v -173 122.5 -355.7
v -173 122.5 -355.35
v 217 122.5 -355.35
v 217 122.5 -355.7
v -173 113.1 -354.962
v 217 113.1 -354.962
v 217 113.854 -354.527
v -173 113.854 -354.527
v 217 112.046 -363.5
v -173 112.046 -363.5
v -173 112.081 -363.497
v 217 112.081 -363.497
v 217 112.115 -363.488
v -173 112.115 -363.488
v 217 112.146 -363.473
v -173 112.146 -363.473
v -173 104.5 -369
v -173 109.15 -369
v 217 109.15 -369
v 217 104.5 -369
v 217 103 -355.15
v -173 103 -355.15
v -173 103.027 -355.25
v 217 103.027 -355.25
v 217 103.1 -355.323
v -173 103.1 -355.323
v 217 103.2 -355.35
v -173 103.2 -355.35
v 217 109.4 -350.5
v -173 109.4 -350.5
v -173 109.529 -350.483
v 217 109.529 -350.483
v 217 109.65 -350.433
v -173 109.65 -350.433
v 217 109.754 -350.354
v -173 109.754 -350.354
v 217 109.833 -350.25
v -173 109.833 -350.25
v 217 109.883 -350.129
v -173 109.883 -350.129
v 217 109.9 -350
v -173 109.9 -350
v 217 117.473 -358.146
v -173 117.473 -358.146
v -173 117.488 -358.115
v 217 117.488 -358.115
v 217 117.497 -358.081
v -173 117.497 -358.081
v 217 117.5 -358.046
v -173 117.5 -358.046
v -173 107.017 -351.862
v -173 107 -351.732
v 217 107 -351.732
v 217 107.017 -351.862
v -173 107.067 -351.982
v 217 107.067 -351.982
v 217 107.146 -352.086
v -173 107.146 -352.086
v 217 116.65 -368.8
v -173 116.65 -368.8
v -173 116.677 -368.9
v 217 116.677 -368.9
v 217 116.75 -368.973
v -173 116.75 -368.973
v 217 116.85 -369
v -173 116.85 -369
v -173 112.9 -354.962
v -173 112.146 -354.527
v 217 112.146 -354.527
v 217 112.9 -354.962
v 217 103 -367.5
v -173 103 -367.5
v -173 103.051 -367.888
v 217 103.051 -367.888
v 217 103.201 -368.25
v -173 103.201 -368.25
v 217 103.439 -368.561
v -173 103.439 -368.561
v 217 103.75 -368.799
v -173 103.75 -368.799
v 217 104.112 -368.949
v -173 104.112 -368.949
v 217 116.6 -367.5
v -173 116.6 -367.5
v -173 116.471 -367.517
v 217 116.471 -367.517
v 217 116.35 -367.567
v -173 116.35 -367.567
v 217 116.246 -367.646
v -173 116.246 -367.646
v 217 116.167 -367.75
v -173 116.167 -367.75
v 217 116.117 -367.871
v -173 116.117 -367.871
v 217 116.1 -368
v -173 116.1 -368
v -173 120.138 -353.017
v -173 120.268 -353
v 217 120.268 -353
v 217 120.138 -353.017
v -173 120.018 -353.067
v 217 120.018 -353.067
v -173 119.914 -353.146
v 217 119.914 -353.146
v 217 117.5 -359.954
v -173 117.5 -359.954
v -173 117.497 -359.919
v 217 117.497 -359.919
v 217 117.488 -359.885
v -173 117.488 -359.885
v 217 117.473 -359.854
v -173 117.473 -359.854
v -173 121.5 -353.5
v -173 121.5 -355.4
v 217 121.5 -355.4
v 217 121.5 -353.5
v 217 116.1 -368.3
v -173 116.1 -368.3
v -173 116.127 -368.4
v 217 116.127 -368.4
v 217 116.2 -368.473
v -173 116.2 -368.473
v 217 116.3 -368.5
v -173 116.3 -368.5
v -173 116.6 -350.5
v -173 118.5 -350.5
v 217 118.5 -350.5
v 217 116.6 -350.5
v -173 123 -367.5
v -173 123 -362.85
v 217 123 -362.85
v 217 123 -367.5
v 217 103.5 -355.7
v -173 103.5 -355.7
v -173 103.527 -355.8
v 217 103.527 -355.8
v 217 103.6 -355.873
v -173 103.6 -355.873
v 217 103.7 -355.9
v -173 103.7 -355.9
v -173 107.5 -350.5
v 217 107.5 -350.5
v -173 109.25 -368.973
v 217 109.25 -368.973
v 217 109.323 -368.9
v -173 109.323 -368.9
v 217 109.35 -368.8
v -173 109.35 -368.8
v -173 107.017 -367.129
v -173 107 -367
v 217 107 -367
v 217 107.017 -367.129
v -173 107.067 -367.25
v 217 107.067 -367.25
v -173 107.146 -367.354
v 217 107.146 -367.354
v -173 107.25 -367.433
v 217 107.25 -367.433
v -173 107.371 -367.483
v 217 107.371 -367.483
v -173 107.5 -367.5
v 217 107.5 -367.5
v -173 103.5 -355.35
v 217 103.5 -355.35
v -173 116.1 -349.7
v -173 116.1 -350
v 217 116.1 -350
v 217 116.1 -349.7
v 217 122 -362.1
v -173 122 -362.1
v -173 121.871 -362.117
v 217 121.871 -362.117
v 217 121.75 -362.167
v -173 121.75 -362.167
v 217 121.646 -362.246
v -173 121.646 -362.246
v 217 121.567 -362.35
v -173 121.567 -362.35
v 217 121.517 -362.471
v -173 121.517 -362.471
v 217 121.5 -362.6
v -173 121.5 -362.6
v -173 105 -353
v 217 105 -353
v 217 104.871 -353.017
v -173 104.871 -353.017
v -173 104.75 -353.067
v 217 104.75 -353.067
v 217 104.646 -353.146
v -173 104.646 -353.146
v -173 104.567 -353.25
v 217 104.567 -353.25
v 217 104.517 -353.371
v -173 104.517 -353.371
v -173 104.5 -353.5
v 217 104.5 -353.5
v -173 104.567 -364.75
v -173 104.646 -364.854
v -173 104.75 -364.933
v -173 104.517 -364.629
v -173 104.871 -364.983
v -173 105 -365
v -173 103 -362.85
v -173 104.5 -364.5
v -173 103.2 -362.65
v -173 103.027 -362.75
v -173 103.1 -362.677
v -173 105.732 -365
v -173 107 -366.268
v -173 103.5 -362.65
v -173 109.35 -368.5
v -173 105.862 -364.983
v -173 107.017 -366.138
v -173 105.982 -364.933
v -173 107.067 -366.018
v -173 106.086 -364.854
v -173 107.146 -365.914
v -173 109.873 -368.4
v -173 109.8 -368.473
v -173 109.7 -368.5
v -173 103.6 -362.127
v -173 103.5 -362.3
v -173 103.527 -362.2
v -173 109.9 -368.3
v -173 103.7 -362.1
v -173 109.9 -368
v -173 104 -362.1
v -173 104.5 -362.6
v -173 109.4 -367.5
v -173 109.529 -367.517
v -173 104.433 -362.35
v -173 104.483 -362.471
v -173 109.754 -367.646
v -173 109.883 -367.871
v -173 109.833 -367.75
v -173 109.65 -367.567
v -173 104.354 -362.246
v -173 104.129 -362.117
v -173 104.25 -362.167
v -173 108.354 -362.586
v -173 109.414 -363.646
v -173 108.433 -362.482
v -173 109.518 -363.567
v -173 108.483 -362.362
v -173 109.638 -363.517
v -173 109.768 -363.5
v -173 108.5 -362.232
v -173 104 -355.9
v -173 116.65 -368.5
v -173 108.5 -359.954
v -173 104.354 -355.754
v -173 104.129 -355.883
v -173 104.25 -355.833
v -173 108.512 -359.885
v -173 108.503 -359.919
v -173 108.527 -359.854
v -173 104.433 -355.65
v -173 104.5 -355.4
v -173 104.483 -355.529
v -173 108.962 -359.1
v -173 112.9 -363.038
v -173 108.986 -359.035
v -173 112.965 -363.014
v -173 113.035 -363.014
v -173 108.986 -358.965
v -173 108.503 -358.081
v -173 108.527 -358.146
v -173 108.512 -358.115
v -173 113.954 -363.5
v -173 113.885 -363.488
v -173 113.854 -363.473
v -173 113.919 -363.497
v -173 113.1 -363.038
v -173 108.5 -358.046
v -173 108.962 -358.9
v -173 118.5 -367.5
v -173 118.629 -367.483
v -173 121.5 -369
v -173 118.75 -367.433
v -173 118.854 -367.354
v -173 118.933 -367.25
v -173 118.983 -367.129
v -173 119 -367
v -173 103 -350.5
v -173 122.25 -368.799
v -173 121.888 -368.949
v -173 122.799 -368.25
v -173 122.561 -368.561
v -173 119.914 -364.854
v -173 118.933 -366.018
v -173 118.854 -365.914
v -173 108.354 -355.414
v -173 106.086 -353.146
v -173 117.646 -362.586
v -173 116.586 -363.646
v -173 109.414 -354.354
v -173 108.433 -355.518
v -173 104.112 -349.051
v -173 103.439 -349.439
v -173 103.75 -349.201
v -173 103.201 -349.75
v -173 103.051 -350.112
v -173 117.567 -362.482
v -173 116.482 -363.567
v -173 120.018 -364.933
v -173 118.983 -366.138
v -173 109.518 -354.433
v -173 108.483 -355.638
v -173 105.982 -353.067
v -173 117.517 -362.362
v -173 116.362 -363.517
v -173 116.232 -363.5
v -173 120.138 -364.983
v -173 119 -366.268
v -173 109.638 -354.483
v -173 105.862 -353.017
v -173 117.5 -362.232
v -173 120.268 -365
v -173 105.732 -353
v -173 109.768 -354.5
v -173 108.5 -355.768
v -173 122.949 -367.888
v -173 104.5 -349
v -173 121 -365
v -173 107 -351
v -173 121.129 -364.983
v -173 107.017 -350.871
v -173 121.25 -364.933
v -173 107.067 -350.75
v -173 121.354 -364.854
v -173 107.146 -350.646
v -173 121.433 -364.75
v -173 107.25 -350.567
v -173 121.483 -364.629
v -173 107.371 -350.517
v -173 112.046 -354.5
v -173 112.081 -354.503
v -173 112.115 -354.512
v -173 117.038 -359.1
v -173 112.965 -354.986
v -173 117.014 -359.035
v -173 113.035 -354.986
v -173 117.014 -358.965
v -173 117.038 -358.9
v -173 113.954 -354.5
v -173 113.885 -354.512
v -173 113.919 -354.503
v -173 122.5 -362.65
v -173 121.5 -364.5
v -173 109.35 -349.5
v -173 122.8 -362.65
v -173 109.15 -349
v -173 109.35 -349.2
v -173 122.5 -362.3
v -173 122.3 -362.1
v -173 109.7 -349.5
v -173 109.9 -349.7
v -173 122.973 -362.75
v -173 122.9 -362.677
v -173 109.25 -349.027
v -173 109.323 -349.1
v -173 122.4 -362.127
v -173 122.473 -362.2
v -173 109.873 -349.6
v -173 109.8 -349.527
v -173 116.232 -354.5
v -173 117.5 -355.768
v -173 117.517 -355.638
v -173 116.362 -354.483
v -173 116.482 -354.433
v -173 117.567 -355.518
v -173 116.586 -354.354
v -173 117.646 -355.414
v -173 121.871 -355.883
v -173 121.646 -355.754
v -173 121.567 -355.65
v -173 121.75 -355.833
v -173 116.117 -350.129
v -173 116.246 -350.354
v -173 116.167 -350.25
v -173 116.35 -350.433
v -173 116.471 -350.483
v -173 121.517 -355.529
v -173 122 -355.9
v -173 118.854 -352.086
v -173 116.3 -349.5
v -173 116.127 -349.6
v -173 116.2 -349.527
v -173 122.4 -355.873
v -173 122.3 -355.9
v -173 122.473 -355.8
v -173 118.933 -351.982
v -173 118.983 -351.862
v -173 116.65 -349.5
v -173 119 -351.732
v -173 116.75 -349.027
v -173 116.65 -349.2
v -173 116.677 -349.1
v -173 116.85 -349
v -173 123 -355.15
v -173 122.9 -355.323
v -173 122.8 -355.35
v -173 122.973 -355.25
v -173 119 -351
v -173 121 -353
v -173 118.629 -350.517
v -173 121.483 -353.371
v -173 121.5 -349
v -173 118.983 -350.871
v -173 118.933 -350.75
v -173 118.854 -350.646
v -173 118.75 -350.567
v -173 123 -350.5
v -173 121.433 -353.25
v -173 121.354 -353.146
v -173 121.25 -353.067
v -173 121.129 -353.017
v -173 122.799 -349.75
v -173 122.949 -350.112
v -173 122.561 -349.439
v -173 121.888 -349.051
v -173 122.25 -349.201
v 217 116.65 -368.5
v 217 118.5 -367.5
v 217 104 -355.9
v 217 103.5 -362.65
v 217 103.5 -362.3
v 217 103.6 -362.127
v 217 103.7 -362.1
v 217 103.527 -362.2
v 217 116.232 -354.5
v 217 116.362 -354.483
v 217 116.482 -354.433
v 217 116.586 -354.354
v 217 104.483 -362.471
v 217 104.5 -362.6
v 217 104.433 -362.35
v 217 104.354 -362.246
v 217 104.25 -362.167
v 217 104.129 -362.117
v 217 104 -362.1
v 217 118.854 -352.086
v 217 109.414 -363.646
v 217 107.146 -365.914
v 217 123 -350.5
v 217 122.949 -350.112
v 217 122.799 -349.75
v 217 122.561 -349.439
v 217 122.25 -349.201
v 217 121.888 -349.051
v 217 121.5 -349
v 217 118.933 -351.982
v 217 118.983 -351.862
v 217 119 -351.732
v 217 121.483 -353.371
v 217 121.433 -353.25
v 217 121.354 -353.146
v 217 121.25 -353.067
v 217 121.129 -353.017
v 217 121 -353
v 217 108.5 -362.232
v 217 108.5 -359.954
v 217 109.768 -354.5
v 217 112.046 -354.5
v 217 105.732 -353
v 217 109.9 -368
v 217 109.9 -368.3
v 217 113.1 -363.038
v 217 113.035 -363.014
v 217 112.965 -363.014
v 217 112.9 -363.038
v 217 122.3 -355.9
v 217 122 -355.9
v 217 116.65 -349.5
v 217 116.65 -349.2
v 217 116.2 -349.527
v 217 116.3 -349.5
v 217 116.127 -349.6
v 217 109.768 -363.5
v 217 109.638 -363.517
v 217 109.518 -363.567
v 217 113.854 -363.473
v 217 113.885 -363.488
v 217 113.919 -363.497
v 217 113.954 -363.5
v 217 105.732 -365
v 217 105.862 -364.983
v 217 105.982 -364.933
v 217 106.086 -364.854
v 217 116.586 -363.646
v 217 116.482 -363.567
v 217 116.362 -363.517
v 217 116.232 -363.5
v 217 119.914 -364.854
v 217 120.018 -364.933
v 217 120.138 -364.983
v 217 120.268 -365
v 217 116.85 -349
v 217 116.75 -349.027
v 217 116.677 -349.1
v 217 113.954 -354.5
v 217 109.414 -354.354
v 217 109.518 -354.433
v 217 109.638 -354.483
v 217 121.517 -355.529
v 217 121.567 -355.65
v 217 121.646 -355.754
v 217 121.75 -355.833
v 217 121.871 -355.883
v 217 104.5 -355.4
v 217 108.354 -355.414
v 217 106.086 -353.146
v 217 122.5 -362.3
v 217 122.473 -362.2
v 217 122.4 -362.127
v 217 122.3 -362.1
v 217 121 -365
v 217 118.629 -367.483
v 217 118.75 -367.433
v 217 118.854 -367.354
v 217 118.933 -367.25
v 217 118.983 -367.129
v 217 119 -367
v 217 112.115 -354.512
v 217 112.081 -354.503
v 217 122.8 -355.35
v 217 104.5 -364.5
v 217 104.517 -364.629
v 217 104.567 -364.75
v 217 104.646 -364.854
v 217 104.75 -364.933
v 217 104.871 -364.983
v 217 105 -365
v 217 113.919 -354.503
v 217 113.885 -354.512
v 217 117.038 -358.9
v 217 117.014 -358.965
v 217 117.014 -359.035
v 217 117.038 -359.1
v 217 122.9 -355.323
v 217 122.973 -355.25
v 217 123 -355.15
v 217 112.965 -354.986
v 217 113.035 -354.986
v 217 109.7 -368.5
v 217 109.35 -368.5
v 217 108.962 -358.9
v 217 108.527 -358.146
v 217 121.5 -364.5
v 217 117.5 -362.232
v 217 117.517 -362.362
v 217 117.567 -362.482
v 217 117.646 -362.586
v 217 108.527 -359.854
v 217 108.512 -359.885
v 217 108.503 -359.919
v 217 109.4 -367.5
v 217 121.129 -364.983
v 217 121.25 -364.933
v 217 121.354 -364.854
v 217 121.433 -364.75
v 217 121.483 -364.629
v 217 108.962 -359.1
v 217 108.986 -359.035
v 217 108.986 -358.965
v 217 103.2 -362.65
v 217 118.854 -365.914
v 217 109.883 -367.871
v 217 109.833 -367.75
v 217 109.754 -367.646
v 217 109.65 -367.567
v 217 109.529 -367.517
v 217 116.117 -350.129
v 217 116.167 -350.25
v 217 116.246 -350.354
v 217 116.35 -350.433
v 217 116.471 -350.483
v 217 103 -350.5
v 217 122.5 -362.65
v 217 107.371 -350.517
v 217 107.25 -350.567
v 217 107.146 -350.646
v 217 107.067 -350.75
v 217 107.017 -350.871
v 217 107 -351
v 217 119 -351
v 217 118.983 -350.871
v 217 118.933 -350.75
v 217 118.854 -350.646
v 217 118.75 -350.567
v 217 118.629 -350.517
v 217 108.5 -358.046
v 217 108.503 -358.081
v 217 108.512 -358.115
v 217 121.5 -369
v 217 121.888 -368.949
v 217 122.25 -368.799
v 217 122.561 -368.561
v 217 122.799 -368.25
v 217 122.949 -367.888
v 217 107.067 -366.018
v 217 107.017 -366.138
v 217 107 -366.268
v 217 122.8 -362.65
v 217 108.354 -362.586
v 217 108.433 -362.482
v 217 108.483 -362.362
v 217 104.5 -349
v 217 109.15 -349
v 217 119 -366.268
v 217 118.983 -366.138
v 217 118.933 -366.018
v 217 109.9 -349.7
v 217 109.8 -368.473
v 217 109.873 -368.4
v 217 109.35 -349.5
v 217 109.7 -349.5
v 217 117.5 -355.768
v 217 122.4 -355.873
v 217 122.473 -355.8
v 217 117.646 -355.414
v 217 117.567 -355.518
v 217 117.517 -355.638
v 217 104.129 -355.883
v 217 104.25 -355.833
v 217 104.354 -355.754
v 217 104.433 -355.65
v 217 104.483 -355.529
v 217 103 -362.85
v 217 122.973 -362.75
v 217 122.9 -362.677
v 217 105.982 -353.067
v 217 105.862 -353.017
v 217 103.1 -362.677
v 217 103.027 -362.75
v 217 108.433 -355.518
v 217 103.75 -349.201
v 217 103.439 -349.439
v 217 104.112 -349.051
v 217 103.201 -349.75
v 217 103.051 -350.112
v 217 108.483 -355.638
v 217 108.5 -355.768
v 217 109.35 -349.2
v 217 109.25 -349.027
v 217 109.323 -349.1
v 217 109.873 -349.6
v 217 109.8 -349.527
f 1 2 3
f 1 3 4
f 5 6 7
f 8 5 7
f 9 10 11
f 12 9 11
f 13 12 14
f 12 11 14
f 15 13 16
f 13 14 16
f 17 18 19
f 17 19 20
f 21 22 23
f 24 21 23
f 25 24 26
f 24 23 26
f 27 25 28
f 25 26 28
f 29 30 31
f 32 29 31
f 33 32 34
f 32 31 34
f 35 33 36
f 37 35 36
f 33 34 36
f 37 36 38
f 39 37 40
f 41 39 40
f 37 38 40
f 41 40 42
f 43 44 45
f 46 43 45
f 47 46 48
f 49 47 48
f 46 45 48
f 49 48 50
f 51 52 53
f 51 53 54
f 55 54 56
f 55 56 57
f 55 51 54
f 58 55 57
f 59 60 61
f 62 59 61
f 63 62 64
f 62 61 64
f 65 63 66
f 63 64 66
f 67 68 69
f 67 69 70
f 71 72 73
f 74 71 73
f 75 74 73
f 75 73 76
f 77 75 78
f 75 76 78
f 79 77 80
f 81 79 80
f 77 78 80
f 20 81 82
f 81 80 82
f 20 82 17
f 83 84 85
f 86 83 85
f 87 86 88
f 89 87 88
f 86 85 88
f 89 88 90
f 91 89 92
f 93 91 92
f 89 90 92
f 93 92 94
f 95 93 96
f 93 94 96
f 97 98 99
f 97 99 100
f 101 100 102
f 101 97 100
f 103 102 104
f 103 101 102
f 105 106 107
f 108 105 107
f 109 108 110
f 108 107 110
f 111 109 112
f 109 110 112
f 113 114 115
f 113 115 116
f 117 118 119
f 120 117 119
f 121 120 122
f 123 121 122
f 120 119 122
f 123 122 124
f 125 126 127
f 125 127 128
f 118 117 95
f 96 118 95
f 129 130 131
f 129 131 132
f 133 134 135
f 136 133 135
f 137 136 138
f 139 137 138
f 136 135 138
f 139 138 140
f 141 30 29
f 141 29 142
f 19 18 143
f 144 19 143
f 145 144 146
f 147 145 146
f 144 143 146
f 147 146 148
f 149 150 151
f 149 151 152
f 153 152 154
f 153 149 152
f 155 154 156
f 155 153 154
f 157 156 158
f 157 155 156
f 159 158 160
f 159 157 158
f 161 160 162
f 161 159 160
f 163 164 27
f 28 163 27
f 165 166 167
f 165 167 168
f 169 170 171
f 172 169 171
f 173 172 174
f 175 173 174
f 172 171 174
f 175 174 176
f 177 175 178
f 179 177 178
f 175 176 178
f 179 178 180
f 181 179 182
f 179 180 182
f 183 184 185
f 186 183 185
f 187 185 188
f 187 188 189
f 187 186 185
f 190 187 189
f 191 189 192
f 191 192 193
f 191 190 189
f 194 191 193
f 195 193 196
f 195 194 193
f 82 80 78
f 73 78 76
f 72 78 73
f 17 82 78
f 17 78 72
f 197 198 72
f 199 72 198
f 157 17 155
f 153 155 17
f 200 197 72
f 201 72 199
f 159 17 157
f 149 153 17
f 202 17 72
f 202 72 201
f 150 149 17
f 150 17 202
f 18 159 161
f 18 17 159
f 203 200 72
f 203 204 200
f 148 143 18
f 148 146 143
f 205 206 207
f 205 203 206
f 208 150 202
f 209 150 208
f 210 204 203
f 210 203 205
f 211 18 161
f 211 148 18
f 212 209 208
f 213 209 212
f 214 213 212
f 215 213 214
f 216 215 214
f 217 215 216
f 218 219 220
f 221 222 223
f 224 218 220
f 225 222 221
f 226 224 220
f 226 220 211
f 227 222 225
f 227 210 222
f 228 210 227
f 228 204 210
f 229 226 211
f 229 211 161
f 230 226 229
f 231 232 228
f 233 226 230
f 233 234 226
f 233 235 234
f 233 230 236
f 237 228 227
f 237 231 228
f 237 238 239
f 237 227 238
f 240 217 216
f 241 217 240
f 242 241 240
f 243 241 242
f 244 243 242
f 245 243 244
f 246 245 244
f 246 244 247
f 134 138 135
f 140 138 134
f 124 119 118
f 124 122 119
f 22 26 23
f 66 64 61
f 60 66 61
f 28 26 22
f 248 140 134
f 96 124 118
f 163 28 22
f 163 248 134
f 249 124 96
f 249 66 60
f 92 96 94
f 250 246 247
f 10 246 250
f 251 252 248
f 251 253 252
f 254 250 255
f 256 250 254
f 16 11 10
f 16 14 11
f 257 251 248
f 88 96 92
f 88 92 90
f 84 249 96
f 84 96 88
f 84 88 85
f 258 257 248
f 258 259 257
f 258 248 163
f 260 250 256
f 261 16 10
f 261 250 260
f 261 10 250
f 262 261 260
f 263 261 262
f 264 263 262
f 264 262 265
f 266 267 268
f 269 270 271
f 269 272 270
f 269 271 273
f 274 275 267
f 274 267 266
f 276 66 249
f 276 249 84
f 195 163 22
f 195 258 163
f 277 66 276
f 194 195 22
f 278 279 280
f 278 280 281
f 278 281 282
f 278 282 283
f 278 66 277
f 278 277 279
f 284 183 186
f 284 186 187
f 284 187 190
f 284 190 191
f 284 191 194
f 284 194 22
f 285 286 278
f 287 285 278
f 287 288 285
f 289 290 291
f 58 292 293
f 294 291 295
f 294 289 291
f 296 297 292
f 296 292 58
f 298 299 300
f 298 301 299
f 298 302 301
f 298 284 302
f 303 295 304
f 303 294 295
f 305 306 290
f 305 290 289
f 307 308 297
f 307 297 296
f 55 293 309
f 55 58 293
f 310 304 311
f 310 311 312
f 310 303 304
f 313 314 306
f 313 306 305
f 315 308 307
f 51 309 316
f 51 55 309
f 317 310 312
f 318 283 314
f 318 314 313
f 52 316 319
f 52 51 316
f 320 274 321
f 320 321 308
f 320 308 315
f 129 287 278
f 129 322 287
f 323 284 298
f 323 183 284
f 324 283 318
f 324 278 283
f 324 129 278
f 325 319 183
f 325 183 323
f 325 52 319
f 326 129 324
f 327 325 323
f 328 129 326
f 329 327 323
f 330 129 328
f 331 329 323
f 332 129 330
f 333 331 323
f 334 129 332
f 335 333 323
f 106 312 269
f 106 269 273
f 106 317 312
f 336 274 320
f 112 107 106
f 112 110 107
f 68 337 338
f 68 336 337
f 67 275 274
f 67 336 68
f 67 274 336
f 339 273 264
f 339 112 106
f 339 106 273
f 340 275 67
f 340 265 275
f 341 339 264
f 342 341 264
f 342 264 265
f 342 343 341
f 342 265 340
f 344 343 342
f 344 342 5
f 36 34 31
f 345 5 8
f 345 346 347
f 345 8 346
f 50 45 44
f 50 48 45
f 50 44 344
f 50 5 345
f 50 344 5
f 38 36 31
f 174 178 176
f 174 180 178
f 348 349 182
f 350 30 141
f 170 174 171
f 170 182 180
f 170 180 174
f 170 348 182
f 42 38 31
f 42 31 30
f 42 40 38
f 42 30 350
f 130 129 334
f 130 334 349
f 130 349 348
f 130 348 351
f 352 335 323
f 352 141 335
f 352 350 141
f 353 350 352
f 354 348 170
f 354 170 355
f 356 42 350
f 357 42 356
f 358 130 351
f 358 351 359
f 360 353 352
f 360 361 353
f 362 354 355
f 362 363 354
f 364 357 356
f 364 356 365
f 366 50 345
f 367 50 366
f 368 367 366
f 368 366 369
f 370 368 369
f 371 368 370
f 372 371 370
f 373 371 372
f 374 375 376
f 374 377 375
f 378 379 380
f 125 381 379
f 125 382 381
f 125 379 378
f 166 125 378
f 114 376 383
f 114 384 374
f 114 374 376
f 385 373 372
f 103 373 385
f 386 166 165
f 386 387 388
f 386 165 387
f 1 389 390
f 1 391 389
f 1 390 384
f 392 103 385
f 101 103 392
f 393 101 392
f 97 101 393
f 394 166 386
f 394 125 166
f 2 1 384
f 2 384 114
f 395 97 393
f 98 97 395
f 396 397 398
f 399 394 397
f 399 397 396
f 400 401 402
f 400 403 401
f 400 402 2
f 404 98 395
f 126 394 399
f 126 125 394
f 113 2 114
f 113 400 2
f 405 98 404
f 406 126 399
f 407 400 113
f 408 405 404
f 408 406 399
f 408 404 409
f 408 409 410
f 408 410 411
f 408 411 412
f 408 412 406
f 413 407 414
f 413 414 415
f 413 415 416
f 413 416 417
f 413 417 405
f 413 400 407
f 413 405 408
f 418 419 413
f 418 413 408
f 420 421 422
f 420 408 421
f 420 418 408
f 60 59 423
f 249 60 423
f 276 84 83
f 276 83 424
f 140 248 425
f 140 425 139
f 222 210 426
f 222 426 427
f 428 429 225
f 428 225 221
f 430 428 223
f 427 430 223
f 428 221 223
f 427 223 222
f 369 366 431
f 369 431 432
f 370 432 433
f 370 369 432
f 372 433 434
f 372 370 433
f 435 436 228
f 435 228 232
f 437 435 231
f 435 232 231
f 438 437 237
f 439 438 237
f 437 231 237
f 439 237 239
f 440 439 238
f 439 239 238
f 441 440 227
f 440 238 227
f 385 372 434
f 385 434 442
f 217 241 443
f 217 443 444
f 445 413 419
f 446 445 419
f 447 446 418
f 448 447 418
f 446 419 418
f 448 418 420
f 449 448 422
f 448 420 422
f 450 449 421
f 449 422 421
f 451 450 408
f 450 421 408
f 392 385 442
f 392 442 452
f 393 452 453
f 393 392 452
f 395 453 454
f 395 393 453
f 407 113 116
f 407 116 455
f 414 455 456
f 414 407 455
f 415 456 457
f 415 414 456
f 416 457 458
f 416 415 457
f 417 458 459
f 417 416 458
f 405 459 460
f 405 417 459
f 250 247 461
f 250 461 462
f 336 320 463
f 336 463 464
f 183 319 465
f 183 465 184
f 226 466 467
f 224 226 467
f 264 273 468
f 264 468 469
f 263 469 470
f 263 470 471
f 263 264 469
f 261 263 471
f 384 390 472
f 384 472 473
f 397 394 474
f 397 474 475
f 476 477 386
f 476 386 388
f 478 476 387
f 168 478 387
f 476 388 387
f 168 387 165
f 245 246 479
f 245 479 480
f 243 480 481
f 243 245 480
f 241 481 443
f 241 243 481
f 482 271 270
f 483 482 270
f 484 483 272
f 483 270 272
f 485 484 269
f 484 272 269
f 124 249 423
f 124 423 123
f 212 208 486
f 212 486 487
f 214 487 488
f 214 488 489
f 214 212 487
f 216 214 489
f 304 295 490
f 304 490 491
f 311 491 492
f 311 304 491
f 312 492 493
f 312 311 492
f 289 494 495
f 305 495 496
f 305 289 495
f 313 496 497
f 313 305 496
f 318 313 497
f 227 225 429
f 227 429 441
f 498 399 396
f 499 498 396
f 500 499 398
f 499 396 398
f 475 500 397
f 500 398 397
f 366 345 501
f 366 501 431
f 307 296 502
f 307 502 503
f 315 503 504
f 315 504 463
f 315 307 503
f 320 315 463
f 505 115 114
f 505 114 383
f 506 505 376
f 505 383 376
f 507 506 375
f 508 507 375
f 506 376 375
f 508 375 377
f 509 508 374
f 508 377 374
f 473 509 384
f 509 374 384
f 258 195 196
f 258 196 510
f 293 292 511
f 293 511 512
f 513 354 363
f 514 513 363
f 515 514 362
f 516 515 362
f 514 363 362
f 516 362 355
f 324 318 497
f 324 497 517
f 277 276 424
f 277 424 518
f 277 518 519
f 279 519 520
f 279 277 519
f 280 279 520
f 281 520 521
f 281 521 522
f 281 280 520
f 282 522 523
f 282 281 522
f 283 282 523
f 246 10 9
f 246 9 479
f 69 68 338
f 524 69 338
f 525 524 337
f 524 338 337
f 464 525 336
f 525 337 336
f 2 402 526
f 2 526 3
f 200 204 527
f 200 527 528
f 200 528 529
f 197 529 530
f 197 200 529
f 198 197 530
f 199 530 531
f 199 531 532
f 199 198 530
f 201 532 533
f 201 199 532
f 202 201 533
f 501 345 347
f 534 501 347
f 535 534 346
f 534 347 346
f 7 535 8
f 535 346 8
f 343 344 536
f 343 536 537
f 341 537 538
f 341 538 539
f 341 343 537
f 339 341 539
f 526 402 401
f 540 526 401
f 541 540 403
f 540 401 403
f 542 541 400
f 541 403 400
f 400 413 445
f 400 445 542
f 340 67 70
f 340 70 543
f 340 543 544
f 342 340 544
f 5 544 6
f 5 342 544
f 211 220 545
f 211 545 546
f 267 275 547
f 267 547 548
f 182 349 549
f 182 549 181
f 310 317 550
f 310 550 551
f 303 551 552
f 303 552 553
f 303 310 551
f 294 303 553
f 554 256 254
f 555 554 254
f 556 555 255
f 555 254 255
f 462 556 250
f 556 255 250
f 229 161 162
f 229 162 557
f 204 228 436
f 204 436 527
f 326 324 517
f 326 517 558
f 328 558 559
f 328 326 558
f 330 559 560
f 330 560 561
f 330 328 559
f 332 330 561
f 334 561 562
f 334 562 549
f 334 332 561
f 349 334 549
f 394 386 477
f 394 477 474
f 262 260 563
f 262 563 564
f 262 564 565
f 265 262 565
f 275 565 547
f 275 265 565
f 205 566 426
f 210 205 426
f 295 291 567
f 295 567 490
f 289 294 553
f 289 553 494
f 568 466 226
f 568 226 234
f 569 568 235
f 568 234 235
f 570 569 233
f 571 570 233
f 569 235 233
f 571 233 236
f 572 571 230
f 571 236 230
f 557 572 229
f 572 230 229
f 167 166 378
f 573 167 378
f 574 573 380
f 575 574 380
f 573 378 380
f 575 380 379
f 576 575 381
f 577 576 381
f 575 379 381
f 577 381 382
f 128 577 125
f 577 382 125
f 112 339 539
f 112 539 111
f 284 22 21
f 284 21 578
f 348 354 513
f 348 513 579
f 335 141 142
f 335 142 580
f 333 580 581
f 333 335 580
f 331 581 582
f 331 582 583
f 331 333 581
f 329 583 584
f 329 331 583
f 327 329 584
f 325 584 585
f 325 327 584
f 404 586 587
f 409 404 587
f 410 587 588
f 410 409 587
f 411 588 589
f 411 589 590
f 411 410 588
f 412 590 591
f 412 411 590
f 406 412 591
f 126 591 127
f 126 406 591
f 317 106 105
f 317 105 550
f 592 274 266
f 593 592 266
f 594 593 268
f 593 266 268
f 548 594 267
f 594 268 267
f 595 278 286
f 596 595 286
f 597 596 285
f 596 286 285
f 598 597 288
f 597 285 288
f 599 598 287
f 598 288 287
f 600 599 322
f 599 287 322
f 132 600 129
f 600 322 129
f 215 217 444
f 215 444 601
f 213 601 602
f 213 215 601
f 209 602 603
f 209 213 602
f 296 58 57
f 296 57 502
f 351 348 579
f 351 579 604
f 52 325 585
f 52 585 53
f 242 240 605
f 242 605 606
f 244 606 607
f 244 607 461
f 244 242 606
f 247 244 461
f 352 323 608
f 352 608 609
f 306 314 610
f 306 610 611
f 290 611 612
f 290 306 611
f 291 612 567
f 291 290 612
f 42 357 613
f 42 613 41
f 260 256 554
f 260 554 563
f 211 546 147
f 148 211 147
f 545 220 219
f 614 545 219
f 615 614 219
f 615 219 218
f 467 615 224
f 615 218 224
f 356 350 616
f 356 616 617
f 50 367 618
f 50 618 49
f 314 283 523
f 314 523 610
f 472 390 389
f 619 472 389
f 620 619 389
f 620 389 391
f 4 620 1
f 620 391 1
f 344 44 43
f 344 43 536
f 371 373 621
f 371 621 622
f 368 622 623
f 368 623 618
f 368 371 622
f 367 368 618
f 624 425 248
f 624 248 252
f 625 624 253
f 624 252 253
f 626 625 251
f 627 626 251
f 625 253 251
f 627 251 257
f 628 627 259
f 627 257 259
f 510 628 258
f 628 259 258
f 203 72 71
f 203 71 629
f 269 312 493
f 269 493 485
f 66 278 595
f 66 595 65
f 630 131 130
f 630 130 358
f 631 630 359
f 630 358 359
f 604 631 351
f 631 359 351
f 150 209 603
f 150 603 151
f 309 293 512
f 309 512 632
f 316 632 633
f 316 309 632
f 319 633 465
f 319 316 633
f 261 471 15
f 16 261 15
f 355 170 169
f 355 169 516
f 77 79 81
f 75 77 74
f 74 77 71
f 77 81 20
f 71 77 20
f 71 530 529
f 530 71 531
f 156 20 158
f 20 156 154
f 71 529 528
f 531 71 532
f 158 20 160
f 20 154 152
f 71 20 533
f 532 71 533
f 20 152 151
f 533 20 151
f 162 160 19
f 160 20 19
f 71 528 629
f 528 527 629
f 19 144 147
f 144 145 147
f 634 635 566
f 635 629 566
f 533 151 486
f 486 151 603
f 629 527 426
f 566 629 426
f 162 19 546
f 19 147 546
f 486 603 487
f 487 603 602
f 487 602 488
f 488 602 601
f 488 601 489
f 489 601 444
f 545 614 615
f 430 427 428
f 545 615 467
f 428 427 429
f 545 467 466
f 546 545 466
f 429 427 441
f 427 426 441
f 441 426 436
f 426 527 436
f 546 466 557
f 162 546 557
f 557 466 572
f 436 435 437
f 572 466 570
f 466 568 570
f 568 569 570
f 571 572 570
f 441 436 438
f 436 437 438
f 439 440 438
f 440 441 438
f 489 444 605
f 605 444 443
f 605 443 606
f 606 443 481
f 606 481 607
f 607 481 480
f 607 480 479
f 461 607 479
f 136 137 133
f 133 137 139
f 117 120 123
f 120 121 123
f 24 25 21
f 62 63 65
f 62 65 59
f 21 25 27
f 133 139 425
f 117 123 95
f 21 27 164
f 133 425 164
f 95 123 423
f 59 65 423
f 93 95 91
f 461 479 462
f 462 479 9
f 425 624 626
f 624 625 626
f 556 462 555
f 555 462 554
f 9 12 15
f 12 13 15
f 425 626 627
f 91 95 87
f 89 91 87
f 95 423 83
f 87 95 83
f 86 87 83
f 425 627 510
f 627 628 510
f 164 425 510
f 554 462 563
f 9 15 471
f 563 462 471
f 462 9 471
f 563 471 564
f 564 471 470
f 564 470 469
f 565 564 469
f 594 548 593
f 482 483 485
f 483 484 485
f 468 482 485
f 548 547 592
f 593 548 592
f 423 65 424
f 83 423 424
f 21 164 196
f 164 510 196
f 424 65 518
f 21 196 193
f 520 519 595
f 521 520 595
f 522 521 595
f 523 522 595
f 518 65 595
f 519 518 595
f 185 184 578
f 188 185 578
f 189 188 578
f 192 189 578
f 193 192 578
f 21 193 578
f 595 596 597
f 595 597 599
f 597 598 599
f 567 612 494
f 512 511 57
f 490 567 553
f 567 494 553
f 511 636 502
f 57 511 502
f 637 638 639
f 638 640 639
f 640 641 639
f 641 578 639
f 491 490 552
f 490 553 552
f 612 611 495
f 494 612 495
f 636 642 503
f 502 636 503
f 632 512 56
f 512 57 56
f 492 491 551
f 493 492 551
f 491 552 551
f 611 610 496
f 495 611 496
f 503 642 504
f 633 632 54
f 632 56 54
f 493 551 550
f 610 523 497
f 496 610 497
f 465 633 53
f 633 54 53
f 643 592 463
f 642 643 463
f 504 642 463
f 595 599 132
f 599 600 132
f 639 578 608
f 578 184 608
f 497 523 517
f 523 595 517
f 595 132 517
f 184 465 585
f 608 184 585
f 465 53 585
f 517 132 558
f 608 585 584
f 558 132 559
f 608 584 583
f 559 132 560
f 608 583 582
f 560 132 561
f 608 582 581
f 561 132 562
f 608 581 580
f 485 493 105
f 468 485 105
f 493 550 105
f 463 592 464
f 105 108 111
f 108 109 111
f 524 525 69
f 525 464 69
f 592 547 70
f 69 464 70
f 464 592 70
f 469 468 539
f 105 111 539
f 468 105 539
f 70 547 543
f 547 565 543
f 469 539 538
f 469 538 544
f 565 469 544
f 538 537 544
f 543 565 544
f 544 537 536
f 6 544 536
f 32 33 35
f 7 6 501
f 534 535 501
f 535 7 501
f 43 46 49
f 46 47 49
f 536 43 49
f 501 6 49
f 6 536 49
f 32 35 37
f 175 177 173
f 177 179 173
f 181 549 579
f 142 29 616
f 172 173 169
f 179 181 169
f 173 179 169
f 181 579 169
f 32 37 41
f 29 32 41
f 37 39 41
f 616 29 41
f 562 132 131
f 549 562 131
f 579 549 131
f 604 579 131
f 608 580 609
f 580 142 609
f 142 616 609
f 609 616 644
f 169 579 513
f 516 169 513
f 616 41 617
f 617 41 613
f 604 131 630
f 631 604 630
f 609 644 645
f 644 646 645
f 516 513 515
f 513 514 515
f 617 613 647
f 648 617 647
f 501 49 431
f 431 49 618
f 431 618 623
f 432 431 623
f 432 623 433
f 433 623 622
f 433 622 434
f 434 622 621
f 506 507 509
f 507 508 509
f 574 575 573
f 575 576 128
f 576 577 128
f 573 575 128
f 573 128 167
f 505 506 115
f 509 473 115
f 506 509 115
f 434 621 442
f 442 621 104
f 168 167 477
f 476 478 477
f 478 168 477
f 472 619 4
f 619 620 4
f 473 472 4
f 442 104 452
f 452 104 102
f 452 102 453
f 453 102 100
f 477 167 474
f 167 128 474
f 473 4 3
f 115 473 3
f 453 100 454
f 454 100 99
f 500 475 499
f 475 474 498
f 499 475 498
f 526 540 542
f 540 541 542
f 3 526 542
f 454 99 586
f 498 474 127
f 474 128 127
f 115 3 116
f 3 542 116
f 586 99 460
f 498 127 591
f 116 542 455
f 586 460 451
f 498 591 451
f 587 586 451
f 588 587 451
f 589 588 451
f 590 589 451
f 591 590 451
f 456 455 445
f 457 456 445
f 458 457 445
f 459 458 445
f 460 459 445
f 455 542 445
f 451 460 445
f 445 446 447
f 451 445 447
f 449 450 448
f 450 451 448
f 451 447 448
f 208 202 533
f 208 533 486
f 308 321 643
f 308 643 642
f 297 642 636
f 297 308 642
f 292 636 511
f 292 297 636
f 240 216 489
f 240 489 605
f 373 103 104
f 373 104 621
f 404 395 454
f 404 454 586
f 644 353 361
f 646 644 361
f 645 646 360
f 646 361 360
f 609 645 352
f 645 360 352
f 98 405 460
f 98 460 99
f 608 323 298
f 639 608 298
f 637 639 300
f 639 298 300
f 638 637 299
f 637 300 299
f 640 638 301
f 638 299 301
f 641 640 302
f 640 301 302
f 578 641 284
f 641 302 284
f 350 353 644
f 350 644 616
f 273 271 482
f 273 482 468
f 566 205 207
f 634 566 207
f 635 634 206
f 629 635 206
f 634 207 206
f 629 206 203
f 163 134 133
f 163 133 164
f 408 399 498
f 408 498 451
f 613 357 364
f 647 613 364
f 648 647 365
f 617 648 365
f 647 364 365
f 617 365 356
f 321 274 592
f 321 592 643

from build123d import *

# Parameters (mm, degrees)
PAD019_DEPTH          = 390
POCKET031_DEPTH       = 390.001
FUSION040_PITCH_ANGLE = 90


with BuildPart() as pad019:
    # Sketch052 → Pad019 (new body)
    with BuildSketch(Plane(origin=(1.5, 0, 0), x_dir=(1, 0, 0), z_dir=(0, 0, 1))):
        with BuildLine():
            Line((0, 20), (4.65, 20))
            ThreePointArc((4.85, 19.8), (4.791421, 19.941421), (4.65, 20))
            Line((4.85, 19.8), (4.85, 19.5))
            Line((4.85, 19.5), (5.2, 19.5))
            ThreePointArc((5.4, 19.3), (5.341421, 19.441421), (5.2, 19.5))
            Line((5.4, 19.3), (5.4, 19))
            ThreePointArc((4.9, 18.5), (5.253553, 18.646446), (5.4, 19))
            Line((4.9, 18.5), (2.999999, 18.5))
            ThreePointArc((2.999999, 18.5), (2.646446, 18.353553), (2.499999, 18))
            Line((2.499999, 18), (2.499999, 17.267767))
            ThreePointArc((2.499999, 17.267767), (2.53806, 17.076425), (2.646446, 16.914213))
            Line((2.646446, 16.914213), (4.914213, 14.646447))
            ThreePointArc((4.914213, 14.646447), (5.076424, 14.53806), (5.267766, 14.5))
            Line((5.267766, 14.5), (7.54641, 14.5))
            ThreePointArc((7.64641, 14.473205), (7.598173, 14.493185), (7.54641, 14.5))
            Line((7.64641, 14.473205), (8.4, 14.03812))
            ThreePointArc((8.4, 14.03812), (8.5, 14.011325), (8.6, 14.03812))
            Line((8.6, 14.03812), (9.35359, 14.473205))
            ThreePointArc((9.45359, 14.5), (9.401827, 14.493185), (9.35359, 14.473205))
            Line((9.45359, 14.5), (11.732234, 14.5))
            ThreePointArc((11.732234, 14.5), (11.923576, 14.53806), (12.085787, 14.646447))
            Line((12.085787, 14.646447), (14.353554, 16.914213))
            ThreePointArc((14.353554, 16.914213), (14.46194, 17.076425), (14.500001, 17.267767))
            Line((14.500001, 17.267767), (14.500001, 18))
            ThreePointArc((14.500001, 18), (14.353554, 18.353553), (14.000001, 18.5))
            Line((14.000001, 18.5), (12.1, 18.5))
            ThreePointArc((11.6, 19), (11.746447, 18.646446), (12.1, 18.5))
            Line((11.6, 19), (11.6, 19.3))
            ThreePointArc((11.8, 19.5), (11.658579, 19.441421), (11.6, 19.3))
            Line((11.8, 19.5), (12.15, 19.5))
            Line((12.15, 19.5), (12.15, 19.8))
            ThreePointArc((12.35, 20), (12.208579, 19.941421), (12.15, 19.8))
            Line((12.35, 20), (17, 20))
            ThreePointArc((18.5, 18.5), (18.06066, 19.56066), (17, 20))
            Line((18.5, 18.5), (18.5, 13.85))
            ThreePointArc((18.3, 13.65), (18.441421, 13.708578), (18.5, 13.85))
            Line((18.3, 13.65), (18, 13.65))
            Line((18, 13.65), (18, 13.3))
            ThreePointArc((17.8, 13.1), (17.941421, 13.158579), (18, 13.3))
            Line((17.8, 13.1), (17.5, 13.1))
            ThreePointArc((17, 13.6), (17.146446, 13.246447), (17.5, 13.1))
            Line((17, 13.6), (17, 15.5))
            ThreePointArc((17, 15.5), (16.853553, 15.853553), (16.5, 16))
            Line((16.5, 16), (15.767767, 16))
            ThreePointArc((15.767767, 16), (15.576425, 15.961939), (15.414213, 15.853553))
            Line((15.414213, 15.853553), (13.146446, 13.585786))
            ThreePointArc((13.146446, 13.585786), (13.03806, 13.423574), (13, 13.232233))
            Line((13, 13.232233), (13, 10.953589))
            ThreePointArc((12.973205, 10.853589), (12.993185, 10.901825), (13, 10.953589))
            Line((12.973205, 10.853589), (12.53812, 10.1))
            ThreePointArc((12.53812, 10.1), (12.511325, 10), (12.53812, 9.9))
            Line((12.53812, 9.9), (12.973205, 9.146411))
            ThreePointArc((13, 9.046411), (12.993185, 9.098175), (12.973205, 9.146411))
            Line((13, 9.046411), (13, 6.767767))
            ThreePointArc((13, 6.767767), (13.03806, 6.576426), (13.146446, 6.414214))
            Line((13.146446, 6.414214), (15.414213, 4.146447))
            ThreePointArc((15.414213, 4.146447), (15.576425, 4.038061), (15.767767, 4))
            Line((15.767767, 4), (16.5, 4))
            ThreePointArc((16.5, 4), (16.853553, 4.146447), (17, 4.5))
            Line((17, 4.5), (17, 6.4))
            ThreePointArc((17.5, 6.9), (17.146446, 6.753553), (17, 6.4))
            Line((17.5, 6.9), (17.8, 6.9))
            ThreePointArc((18, 6.7), (17.941421, 6.841421), (17.8, 6.9))
            Line((18, 6.7), (18, 6.35))
            Line((18, 6.35), (18.3, 6.35))
            ThreePointArc((18.5, 6.15), (18.441421, 6.291422), (18.3, 6.35))
            Line((18.5, 6.15), (18.5, 1.5))
            ThreePointArc((17, 0), (18.06066, 0.43934), (18.5, 1.5))
            Line((17, 0), (12.35, 0))
            ThreePointArc((12.15, 0.2), (12.208579, 0.058579), (12.35, 0))
            Line((12.15, 0.2), (12.15, 0.5))
            Line((12.15, 0.5), (11.8, 0.5))
            ThreePointArc((11.6, 0.7), (11.658579, 0.558579), (11.8, 0.5))
            Line((11.6, 0.7), (11.6, 1))
            ThreePointArc((12.1, 1.5), (11.746447, 1.353554), (11.6, 1))
            Line((12.1, 1.5), (14.000001, 1.5))
            ThreePointArc((14.000001, 1.5), (14.353554, 1.646447), (14.500001, 2))
            Line((14.500001, 2), (14.500001, 2.732233))
            ThreePointArc((14.500001, 2.732233), (14.46194, 2.923575), (14.353554, 3.085787))
            Line((14.353554, 3.085787), (12.085787, 5.353553))
            ThreePointArc((12.085787, 5.353553), (11.923576, 5.46194), (11.732234, 5.5))
            Line((11.732234, 5.5), (9.45359, 5.5))
            ThreePointArc((9.35359, 5.526795), (9.401827, 5.506815), (9.45359, 5.5))
            Line((9.35359, 5.526795), (8.6, 5.96188))
            ThreePointArc((8.6, 5.96188), (8.5, 5.988675), (8.4, 5.96188))
            Line((8.4, 5.96188), (7.64641, 5.526795))
            ThreePointArc((7.54641, 5.5), (7.598173, 5.506815), (7.64641, 5.526795))
            Line((7.54641, 5.5), (5.267766, 5.5))
            ThreePointArc((5.267766, 5.5), (5.076424, 5.46194), (4.914213, 5.353553))
            Line((4.914213, 5.353553), (2.646446, 3.085787))
            ThreePointArc((2.646446, 3.085787), (2.53806, 2.923575), (2.499999, 2.732233))
            Line((2.499999, 2.732233), (2.499999, 2))
            ThreePointArc((2.499999, 2), (2.646446, 1.646447), (2.999999, 1.5))
            Line((2.999999, 1.5), (4.9, 1.5))
            ThreePointArc((5.4, 1), (5.253553, 1.353554), (4.9, 1.5))
            Line((5.4, 1), (5.4, 0.7))
            ThreePointArc((5.2, 0.5), (5.341421, 0.558579), (5.4, 0.7))
            Line((5.2, 0.5), (4.85, 0.5))
            Line((4.85, 0.5), (4.85, 0.2))
            ThreePointArc((4.65, 0), (4.791421, 0.058579), (4.85, 0.2))
            Line((4.65, 0), (0, 0))
            ThreePointArc((-1.5, 1.5), (-1.06066, 0.43934), (0, 0))
            Line((-1.5, 1.5), (-1.5, 6.15))
            ThreePointArc((-1.3, 6.35), (-1.441421, 6.291422), (-1.5, 6.15))
            Line((-1.3, 6.35), (-1, 6.35))
            Line((-1, 6.35), (-1, 6.7))
            ThreePointArc((-0.8, 6.9), (-0.941421, 6.841421), (-1, 6.7))
            Line((-0.8, 6.9), (-0.5, 6.9))
            ThreePointArc((0, 6.4), (-0.146446, 6.753553), (-0.5, 6.9))
            Line((0, 6.4), (0, 4.5))
            ThreePointArc((0, 4.5), (0.146447, 4.146447), (0.5, 4))
            Line((0.5, 4), (1.232233, 4))
            ThreePointArc((1.232233, 4), (1.423575, 4.038061), (1.585787, 4.146447))
            Line((1.585787, 4.146447), (3.853554, 6.414214))
            ThreePointArc((3.853554, 6.414214), (3.96194, 6.576426), (4, 6.767767))
            Line((4, 6.767767), (4, 9.046411))
            ThreePointArc((4.026795, 9.146411), (4.006815, 9.098175), (4, 9.046411))
            Line((4.026795, 9.146411), (4.46188, 9.9))
            ThreePointArc((4.46188, 9.9), (4.488675, 10), (4.46188, 10.1))
            Line((4.46188, 10.1), (4.026795, 10.853589))
            ThreePointArc((4, 10.953589), (4.006815, 10.901825), (4.026795, 10.853589))
            Line((4, 10.953589), (4, 13.232233))
            ThreePointArc((4, 13.232233), (3.96194, 13.423574), (3.853554, 13.585786))
            Line((3.853554, 13.585786), (1.585787, 15.853553))
            ThreePointArc((1.585787, 15.853553), (1.423575, 15.961939), (1.232233, 16))
            Line((1.232233, 16), (0.5, 16))
            ThreePointArc((0.5, 16), (0.146447, 15.853553), (0, 15.5))
            Line((0, 15.5), (0, 13.6))
            ThreePointArc((-0.5, 13.1), (-0.146446, 13.246447), (0, 13.6))
            Line((-0.5, 13.1), (-0.8, 13.1))
            ThreePointArc((-1, 13.3), (-0.941421, 13.158579), (-0.8, 13.1))
            Line((-1, 13.3), (-1, 13.65))
            Line((-1, 13.65), (-1.3, 13.65))
            ThreePointArc((-1.5, 13.85), (-1.441421, 13.708578), (-1.3, 13.65))
            Line((-1.5, 13.85), (-1.5, 18.5))
            ThreePointArc((0, 20), (-1.06066, 19.56066), (-1.5, 18.5))
        make_face()
    extrude(amount=PAD019_DEPTH)


with BuildPart() as pocket031:
    # Pocket031 base: copy of Pad019
    add(pad019.part)

    # Sketch053 → Pocket031 (cut, through all)
    with BuildSketch(Plane(origin=(1.5, 0, 390), x_dir=(1, 0, 0), z_dir=(0, 0, 1))):
        with BuildLine():
            ThreePointArc((6.586105, 12.989641), (5.988263, 12.50841), (5.507825, 11.909931))
            Line((6.054705, 11.258185), (5.507825, 11.909931))
            ThreePointArc((6.054705, 11.258185), (5.75, 10), (6.054705, 8.741815))
            Line((5.507825, 8.090069), (6.054705, 8.741815))
            ThreePointArc((5.507825, 8.090069), (5.988263, 7.49159), (6.586105, 7.010359))
            Line((7.241815, 7.554705), (6.586105, 7.010359))
            ThreePointArc((7.241815, 7.554705), (8.5, 7.25), (9.758185, 7.554705))
            Line((10.413895, 7.010359), (9.758185, 7.554705))
            ThreePointArc((10.413895, 7.010359), (11.011737, 7.49159), (11.492175, 8.090069))
            Line((10.945295, 8.741815), (11.492175, 8.090069))
            ThreePointArc((10.945295, 8.741815), (11.25, 10), (10.945295, 11.258185))
            Line((11.492175, 11.909931), (10.945295, 11.258185))
            ThreePointArc((11.492175, 11.909931), (11.011737, 12.50841), (10.413895, 12.989641))
            Line((9.758185, 12.445295), (10.413895, 12.989641))
            ThreePointArc((9.758185, 12.445295), (8.5, 12.75), (7.241815, 12.445295))
            Line((6.586105, 12.989641), (7.241815, 12.445295))
        make_face()
    extrude(amount=-POCKET031_DEPTH, mode=Mode.SUBTRACT)


with BuildPart() as fusion040:
    # Fusion040 base: copy of Pad019
    add(pad019.part)

    # Fusion040: union Pocket031
    add(pocket031.part)


with BuildPart() as fusion040_1:
    # Fusion040 pitch: moved
    add(fusion040.part.rotate(Axis((0, 0, 0), (0, 1, 0)), FUSION040_PITCH_ANGLE))


with BuildPart() as fusion040_2:
    # Fusion040 placement: moved
    add(fusion040_1.part.moved(Location((-173, 103, -349))))


solid = fusion040_2.part
